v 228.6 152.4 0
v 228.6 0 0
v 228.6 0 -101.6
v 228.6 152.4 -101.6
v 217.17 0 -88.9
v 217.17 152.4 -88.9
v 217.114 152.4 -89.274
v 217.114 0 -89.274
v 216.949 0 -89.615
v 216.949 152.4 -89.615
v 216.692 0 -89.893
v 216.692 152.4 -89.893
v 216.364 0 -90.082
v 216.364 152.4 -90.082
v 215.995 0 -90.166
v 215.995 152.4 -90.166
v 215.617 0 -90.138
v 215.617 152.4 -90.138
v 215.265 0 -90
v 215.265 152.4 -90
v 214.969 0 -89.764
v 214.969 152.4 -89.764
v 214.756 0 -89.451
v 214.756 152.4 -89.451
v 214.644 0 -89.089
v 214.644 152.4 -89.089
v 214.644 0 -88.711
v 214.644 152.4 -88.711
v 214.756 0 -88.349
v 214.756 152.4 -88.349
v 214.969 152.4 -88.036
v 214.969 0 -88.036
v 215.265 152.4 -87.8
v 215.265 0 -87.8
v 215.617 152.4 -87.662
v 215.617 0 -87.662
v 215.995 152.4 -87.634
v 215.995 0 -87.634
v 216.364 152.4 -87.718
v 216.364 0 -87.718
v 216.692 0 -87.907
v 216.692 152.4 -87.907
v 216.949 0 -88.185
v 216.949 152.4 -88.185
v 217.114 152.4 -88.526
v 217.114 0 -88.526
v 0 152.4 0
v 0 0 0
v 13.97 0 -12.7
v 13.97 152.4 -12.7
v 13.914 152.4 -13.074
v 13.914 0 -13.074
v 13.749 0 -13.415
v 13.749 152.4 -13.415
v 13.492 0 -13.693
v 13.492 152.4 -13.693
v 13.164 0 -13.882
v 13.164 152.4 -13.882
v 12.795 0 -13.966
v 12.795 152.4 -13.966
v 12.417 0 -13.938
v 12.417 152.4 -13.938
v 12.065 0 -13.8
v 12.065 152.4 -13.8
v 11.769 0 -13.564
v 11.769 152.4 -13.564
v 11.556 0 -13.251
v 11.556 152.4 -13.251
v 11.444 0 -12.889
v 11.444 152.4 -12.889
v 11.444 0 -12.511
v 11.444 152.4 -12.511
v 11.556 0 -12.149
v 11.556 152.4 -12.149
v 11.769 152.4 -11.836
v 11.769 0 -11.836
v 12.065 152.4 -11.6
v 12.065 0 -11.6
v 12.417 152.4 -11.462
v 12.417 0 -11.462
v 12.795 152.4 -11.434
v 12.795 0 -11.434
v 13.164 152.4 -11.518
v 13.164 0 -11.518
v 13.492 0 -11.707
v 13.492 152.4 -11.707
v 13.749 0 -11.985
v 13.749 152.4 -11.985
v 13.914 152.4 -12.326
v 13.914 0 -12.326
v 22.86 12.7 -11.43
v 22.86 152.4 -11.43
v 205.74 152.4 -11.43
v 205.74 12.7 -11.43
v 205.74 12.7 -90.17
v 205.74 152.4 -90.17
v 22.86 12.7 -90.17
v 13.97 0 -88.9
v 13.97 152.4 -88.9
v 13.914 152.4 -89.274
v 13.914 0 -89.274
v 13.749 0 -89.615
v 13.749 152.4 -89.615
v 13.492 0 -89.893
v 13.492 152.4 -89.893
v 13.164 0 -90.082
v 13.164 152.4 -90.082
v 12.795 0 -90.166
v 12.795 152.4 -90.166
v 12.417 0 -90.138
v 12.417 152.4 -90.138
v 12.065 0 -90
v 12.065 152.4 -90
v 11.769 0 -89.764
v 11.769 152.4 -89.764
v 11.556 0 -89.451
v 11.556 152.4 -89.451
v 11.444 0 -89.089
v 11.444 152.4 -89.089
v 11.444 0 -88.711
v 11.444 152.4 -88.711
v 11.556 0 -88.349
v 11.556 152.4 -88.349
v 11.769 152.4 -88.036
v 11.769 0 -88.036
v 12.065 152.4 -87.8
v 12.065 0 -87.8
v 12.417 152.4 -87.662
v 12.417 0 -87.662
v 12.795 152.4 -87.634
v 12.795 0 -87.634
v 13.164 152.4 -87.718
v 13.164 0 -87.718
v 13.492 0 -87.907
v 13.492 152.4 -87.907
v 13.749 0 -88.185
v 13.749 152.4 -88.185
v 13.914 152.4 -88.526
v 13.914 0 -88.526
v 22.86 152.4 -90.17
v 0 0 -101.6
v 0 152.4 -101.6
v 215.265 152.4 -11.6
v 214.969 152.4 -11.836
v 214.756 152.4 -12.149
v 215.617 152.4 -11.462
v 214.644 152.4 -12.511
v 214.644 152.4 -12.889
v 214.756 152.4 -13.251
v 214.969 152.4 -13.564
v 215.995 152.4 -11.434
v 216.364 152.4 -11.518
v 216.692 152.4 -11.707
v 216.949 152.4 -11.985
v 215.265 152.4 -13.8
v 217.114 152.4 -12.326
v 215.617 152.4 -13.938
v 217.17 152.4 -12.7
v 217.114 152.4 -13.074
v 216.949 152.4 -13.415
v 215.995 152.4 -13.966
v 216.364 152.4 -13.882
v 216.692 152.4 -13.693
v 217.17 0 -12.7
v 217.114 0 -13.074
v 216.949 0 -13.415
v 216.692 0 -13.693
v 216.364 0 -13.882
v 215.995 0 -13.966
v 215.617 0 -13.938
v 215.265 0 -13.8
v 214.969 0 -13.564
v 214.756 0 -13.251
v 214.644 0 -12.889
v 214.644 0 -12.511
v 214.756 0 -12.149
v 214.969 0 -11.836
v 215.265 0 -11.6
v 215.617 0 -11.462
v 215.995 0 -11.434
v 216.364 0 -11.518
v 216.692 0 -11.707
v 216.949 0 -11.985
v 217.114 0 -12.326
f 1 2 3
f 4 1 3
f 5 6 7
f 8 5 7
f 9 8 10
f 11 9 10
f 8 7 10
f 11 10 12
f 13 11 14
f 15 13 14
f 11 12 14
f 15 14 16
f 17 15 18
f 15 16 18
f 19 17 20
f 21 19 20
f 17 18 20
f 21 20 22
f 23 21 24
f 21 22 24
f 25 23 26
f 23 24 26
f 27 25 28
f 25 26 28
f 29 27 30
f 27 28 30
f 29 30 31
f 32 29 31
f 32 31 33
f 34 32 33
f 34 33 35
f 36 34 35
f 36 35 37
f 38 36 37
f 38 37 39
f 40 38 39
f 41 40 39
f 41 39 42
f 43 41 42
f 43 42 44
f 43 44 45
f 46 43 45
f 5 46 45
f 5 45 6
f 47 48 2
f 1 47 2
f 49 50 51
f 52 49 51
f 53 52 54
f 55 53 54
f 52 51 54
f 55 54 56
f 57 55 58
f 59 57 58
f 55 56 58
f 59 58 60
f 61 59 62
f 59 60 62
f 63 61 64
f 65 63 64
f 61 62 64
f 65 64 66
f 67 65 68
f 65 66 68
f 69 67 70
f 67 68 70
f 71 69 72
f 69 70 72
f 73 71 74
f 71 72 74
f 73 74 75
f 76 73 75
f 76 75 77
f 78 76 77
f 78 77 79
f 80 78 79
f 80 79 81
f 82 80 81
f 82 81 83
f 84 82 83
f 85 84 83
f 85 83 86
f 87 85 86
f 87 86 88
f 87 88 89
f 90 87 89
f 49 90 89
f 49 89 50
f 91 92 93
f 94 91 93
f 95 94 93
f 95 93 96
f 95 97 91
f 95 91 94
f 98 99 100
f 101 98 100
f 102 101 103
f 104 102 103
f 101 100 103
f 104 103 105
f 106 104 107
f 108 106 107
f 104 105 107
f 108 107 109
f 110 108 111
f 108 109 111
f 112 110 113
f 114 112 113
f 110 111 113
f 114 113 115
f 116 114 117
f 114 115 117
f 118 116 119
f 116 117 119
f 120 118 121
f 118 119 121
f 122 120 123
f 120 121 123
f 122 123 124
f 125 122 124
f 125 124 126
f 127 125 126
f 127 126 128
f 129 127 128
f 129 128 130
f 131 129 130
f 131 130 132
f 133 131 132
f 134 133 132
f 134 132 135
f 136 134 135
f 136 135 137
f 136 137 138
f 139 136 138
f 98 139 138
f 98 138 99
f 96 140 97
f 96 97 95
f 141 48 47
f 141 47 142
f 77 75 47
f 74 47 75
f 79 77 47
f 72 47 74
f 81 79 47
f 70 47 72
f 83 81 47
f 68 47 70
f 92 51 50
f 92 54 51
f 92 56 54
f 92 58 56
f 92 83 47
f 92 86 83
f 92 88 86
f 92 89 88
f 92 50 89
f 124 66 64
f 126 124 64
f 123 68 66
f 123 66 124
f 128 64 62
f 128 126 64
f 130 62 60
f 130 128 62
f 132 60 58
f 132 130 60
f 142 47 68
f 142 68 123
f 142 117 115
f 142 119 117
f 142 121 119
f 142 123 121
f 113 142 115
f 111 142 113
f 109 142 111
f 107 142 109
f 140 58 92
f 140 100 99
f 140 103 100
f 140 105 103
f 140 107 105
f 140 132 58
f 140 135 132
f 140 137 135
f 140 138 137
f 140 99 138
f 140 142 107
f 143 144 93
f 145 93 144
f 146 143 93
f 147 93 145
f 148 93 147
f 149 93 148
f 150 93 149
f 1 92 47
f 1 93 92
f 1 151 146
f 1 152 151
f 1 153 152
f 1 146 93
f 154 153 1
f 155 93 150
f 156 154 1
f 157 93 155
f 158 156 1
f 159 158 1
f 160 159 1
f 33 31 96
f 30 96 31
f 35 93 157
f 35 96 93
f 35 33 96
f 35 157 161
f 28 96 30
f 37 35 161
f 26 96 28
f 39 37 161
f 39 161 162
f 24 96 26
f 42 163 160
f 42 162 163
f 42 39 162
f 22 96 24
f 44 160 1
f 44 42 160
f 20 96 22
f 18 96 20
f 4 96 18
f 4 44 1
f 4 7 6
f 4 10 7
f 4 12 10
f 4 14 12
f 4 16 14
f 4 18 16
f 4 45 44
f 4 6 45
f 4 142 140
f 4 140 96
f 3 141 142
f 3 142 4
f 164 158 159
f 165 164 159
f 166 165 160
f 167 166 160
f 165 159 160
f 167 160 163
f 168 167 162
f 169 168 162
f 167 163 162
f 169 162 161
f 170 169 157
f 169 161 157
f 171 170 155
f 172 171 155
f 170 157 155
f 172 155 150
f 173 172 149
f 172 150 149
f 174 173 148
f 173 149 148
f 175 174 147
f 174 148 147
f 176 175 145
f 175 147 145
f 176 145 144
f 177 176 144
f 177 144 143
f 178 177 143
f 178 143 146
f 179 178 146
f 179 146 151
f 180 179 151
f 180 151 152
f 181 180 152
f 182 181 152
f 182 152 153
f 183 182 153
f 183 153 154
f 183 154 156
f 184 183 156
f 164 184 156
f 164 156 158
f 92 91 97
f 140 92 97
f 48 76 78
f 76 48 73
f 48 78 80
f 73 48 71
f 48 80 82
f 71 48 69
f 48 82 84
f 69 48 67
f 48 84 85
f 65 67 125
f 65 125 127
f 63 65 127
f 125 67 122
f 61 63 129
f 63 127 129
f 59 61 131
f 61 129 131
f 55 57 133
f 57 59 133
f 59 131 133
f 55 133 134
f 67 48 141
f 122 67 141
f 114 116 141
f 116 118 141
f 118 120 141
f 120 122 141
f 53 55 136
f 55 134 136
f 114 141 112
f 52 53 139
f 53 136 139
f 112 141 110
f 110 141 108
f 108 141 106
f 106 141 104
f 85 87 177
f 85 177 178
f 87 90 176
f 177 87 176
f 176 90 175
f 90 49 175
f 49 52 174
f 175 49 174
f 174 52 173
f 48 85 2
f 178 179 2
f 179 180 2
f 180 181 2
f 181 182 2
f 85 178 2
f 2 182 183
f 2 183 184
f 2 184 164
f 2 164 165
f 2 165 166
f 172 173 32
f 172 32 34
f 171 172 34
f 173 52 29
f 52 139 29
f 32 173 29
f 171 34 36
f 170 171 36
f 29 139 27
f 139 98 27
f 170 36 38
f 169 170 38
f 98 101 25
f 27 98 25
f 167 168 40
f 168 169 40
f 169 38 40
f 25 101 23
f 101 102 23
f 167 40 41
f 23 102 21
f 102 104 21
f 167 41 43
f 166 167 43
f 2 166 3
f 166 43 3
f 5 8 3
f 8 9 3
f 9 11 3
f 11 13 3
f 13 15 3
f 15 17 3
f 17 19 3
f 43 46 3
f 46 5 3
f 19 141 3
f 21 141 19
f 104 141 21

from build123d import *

# Parameters (mm, degrees)
SKETCH4_W           = 228.6
SKETCH4_H           = 101.6
BOSS_EXTRUDE2_DEPTH = 152.4
SKETCH5_W           = 182.88
SKETCH5_H           = 78.74
CUT_EXTRUDE3_DEPTH  = 139.7
SKETCH6_R           = 1.27
CUT_EXTRUDE4_DEPTH  = 153.4


with BuildPart() as part:
    # Sketch4 → Boss-Extrude2 (new body)
    with BuildSketch(Plane(origin=(0, 0, 0), x_dir=(1, 0, 0), z_dir=(0, 1, 0))):
        with Locations((114.3, 50.8)):
            Rectangle(SKETCH4_W, SKETCH4_H)
    extrude(amount=BOSS_EXTRUDE2_DEPTH)

    # Sketch5 → Cut-Extrude3 (cut)
    with BuildSketch(Plane(origin=(0, 152.4, 0), x_dir=(1, 0, 0), z_dir=(0, 1, 0))):
        with Locations((114.3, 50.8)):
            Rectangle(SKETCH5_W, SKETCH5_H)
    extrude(amount=-CUT_EXTRUDE3_DEPTH, mode=Mode.SUBTRACT)

    # Sketch6 → Cut-Extrude4 (cut, through all)
    with BuildSketch(Plane(origin=(0, 152.4, 0), x_dir=(1, 0, 0), z_dir=(0, 1, 0))):
        with Locations((12.7, 88.9)):
            Circle(SKETCH6_R)
        with Locations((215.9, 88.9)):
            Circle(SKETCH6_R)
        with Locations((12.7, 12.7)):
            Circle(SKETCH6_R)
        with Locations((215.9, 12.7)):
            Circle(SKETCH6_R)
    extrude(amount=-CUT_EXTRUDE4_DEPTH, mode=Mode.SUBTRACT)


solid = part.part
